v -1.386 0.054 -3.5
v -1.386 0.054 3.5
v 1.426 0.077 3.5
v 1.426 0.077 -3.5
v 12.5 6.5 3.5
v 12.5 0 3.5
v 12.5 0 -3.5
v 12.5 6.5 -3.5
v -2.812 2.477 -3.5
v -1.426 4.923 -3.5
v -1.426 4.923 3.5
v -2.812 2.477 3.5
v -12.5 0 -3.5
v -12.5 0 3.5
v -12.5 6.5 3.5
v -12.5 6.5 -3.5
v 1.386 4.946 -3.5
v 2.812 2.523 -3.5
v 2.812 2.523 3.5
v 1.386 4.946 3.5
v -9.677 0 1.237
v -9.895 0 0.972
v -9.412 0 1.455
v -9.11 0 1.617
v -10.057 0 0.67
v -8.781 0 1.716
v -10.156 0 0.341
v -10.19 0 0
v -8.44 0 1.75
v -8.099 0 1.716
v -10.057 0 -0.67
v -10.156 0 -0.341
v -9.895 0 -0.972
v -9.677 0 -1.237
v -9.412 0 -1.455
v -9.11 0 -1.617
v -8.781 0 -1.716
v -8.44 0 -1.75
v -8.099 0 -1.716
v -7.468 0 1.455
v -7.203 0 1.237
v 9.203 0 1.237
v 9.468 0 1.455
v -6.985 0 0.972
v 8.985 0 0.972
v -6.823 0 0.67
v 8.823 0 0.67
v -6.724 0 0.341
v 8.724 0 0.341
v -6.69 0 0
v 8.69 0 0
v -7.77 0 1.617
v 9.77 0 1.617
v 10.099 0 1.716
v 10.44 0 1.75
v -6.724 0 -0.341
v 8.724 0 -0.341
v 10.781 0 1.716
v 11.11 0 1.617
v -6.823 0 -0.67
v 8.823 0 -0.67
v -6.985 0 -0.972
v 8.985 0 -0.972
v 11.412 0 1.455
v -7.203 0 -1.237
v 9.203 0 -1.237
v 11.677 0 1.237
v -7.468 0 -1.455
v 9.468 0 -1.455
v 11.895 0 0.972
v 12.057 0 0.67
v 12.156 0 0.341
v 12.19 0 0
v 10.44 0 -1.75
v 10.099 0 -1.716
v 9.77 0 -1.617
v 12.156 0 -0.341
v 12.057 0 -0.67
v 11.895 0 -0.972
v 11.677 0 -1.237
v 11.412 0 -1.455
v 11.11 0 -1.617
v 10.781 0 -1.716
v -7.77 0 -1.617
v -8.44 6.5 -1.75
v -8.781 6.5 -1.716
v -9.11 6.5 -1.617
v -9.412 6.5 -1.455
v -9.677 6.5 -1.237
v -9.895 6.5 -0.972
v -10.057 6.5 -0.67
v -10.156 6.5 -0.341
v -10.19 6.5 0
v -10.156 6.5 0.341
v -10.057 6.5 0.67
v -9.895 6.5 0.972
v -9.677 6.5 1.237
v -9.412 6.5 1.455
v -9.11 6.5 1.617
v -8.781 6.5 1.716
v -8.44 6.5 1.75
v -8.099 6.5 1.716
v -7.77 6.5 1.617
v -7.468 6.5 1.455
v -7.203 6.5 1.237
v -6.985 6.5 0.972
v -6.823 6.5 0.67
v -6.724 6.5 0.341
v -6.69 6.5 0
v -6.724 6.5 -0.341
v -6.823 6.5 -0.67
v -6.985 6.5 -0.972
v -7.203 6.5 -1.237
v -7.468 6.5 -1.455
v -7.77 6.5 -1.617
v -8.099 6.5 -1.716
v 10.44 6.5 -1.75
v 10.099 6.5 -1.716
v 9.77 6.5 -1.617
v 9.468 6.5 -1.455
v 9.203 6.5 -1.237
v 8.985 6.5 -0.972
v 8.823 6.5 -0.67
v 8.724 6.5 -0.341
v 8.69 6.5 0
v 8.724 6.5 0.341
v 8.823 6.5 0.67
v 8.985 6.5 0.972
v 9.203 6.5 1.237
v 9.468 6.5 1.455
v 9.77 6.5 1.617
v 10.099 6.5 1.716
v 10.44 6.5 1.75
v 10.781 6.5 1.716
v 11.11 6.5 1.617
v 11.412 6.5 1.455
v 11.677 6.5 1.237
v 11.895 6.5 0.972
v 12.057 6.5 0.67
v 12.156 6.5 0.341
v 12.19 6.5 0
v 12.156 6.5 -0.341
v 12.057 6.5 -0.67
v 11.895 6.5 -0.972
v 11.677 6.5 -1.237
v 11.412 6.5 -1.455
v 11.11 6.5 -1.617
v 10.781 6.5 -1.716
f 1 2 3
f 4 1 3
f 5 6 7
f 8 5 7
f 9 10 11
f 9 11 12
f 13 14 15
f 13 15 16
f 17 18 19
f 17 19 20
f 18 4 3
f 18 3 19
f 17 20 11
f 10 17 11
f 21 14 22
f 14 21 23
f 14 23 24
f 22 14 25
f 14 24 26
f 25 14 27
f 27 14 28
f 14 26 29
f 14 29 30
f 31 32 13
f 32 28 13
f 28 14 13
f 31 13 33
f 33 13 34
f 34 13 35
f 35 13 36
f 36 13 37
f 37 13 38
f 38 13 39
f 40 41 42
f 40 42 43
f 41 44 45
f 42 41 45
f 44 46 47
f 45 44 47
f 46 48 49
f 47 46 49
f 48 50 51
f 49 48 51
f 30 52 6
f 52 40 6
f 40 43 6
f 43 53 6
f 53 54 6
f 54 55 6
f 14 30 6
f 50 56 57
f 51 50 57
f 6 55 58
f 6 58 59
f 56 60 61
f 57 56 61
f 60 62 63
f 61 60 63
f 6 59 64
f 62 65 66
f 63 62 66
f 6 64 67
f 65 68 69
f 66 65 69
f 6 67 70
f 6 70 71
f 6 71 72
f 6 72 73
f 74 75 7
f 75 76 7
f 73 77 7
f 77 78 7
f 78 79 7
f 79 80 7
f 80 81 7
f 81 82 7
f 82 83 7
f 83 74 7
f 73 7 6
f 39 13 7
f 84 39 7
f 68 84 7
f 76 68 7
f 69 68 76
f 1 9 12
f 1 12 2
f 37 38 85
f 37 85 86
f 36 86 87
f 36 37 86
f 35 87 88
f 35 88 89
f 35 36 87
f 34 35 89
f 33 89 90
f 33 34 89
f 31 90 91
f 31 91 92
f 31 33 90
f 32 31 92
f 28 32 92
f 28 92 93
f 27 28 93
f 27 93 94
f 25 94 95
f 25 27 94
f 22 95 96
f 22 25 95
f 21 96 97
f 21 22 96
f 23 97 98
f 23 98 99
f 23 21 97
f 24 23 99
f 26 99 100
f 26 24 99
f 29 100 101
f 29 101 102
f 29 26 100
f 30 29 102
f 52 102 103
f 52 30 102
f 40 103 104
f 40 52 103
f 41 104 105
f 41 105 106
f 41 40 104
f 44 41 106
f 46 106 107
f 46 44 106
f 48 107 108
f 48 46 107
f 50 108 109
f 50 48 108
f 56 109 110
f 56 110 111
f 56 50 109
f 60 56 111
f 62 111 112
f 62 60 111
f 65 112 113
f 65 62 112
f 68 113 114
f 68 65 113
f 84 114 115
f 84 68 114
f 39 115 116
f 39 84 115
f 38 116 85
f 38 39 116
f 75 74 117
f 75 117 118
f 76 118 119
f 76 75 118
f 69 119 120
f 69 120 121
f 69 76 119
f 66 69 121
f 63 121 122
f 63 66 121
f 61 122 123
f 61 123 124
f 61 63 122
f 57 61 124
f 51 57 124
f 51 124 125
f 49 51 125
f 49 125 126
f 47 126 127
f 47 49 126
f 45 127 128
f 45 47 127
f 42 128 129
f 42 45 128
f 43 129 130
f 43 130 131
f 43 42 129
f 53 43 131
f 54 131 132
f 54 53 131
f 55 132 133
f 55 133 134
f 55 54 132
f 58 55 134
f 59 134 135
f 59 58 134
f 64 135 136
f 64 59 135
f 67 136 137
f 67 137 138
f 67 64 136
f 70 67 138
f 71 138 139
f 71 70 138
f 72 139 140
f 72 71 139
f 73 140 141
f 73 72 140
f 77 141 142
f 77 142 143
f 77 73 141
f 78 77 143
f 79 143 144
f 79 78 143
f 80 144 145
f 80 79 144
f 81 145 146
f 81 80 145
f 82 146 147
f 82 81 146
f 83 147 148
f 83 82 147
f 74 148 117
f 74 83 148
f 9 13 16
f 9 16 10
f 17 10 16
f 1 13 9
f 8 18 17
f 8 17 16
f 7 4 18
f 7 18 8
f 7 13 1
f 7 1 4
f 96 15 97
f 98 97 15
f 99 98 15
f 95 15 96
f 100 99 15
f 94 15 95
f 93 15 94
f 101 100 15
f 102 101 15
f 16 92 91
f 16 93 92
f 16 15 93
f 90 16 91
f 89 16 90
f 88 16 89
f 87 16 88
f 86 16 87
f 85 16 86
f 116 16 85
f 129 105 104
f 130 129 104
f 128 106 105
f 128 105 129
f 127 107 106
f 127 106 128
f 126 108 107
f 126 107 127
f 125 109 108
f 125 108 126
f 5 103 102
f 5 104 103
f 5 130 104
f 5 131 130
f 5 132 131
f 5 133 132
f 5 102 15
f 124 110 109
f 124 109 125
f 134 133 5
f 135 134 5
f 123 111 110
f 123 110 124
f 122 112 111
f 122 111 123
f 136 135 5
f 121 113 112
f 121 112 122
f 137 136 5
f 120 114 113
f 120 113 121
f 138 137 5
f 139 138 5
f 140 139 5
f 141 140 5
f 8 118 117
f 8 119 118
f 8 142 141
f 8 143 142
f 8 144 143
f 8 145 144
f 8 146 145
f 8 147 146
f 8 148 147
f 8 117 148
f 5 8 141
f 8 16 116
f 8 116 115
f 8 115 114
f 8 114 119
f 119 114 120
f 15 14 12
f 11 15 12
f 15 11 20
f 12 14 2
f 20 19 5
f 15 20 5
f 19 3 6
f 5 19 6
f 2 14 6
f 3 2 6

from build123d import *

# Parameters (mm, degrees)
SKETCH1_W               = 25
SKETCH1_H               = 7
SKETCH1_R               = 1.75
BOSS_EXTRUDE1_DEPTH     = 6.5
CUT_EXTRUDE1_DEPTH      = 15.517231141
CUT_EXTRUDE1_DEPTH_BACK = 15.517231141


with BuildPart() as part:
    # Sketch1 → Boss-Extrude1 (new body)
    with BuildSketch(Plane(origin=(0, 0, 0), x_dir=(1, 0, 0), z_dir=(0, 1, 0))):
        Rectangle(SKETCH1_W, SKETCH1_H)
        with Locations(Location((10.44, 0, 0), (0, 0, 90))):
            Circle(SKETCH1_R, mode=Mode.SUBTRACT)
        with Locations(Location((-8.44, 0, 0), (0, 0, 90))):
            Circle(SKETCH1_R, mode=Mode.SUBTRACT)
    extrude(amount=BOSS_EXTRUDE1_DEPTH)

    # Sketch3 → Cut-Extrude1 (cut, two sides: drawn at the far end of the back side and taken through both)
    with BuildSketch(Plane.XY.offset(-CUT_EXTRUDE1_DEPTH_BACK)):
        Polygon((1.425586366, 0.076503178), (2.811602997, 2.522845597), (1.386016631, 4.946342419), (-1.425586366, 4.923496822), (-2.811602997, 2.477154403), (-1.386016631, 0.053657581), align=None)
    extrude(amount=CUT_EXTRUDE1_DEPTH + CUT_EXTRUDE1_DEPTH_BACK, mode=Mode.SUBTRACT)


solid = part.part
